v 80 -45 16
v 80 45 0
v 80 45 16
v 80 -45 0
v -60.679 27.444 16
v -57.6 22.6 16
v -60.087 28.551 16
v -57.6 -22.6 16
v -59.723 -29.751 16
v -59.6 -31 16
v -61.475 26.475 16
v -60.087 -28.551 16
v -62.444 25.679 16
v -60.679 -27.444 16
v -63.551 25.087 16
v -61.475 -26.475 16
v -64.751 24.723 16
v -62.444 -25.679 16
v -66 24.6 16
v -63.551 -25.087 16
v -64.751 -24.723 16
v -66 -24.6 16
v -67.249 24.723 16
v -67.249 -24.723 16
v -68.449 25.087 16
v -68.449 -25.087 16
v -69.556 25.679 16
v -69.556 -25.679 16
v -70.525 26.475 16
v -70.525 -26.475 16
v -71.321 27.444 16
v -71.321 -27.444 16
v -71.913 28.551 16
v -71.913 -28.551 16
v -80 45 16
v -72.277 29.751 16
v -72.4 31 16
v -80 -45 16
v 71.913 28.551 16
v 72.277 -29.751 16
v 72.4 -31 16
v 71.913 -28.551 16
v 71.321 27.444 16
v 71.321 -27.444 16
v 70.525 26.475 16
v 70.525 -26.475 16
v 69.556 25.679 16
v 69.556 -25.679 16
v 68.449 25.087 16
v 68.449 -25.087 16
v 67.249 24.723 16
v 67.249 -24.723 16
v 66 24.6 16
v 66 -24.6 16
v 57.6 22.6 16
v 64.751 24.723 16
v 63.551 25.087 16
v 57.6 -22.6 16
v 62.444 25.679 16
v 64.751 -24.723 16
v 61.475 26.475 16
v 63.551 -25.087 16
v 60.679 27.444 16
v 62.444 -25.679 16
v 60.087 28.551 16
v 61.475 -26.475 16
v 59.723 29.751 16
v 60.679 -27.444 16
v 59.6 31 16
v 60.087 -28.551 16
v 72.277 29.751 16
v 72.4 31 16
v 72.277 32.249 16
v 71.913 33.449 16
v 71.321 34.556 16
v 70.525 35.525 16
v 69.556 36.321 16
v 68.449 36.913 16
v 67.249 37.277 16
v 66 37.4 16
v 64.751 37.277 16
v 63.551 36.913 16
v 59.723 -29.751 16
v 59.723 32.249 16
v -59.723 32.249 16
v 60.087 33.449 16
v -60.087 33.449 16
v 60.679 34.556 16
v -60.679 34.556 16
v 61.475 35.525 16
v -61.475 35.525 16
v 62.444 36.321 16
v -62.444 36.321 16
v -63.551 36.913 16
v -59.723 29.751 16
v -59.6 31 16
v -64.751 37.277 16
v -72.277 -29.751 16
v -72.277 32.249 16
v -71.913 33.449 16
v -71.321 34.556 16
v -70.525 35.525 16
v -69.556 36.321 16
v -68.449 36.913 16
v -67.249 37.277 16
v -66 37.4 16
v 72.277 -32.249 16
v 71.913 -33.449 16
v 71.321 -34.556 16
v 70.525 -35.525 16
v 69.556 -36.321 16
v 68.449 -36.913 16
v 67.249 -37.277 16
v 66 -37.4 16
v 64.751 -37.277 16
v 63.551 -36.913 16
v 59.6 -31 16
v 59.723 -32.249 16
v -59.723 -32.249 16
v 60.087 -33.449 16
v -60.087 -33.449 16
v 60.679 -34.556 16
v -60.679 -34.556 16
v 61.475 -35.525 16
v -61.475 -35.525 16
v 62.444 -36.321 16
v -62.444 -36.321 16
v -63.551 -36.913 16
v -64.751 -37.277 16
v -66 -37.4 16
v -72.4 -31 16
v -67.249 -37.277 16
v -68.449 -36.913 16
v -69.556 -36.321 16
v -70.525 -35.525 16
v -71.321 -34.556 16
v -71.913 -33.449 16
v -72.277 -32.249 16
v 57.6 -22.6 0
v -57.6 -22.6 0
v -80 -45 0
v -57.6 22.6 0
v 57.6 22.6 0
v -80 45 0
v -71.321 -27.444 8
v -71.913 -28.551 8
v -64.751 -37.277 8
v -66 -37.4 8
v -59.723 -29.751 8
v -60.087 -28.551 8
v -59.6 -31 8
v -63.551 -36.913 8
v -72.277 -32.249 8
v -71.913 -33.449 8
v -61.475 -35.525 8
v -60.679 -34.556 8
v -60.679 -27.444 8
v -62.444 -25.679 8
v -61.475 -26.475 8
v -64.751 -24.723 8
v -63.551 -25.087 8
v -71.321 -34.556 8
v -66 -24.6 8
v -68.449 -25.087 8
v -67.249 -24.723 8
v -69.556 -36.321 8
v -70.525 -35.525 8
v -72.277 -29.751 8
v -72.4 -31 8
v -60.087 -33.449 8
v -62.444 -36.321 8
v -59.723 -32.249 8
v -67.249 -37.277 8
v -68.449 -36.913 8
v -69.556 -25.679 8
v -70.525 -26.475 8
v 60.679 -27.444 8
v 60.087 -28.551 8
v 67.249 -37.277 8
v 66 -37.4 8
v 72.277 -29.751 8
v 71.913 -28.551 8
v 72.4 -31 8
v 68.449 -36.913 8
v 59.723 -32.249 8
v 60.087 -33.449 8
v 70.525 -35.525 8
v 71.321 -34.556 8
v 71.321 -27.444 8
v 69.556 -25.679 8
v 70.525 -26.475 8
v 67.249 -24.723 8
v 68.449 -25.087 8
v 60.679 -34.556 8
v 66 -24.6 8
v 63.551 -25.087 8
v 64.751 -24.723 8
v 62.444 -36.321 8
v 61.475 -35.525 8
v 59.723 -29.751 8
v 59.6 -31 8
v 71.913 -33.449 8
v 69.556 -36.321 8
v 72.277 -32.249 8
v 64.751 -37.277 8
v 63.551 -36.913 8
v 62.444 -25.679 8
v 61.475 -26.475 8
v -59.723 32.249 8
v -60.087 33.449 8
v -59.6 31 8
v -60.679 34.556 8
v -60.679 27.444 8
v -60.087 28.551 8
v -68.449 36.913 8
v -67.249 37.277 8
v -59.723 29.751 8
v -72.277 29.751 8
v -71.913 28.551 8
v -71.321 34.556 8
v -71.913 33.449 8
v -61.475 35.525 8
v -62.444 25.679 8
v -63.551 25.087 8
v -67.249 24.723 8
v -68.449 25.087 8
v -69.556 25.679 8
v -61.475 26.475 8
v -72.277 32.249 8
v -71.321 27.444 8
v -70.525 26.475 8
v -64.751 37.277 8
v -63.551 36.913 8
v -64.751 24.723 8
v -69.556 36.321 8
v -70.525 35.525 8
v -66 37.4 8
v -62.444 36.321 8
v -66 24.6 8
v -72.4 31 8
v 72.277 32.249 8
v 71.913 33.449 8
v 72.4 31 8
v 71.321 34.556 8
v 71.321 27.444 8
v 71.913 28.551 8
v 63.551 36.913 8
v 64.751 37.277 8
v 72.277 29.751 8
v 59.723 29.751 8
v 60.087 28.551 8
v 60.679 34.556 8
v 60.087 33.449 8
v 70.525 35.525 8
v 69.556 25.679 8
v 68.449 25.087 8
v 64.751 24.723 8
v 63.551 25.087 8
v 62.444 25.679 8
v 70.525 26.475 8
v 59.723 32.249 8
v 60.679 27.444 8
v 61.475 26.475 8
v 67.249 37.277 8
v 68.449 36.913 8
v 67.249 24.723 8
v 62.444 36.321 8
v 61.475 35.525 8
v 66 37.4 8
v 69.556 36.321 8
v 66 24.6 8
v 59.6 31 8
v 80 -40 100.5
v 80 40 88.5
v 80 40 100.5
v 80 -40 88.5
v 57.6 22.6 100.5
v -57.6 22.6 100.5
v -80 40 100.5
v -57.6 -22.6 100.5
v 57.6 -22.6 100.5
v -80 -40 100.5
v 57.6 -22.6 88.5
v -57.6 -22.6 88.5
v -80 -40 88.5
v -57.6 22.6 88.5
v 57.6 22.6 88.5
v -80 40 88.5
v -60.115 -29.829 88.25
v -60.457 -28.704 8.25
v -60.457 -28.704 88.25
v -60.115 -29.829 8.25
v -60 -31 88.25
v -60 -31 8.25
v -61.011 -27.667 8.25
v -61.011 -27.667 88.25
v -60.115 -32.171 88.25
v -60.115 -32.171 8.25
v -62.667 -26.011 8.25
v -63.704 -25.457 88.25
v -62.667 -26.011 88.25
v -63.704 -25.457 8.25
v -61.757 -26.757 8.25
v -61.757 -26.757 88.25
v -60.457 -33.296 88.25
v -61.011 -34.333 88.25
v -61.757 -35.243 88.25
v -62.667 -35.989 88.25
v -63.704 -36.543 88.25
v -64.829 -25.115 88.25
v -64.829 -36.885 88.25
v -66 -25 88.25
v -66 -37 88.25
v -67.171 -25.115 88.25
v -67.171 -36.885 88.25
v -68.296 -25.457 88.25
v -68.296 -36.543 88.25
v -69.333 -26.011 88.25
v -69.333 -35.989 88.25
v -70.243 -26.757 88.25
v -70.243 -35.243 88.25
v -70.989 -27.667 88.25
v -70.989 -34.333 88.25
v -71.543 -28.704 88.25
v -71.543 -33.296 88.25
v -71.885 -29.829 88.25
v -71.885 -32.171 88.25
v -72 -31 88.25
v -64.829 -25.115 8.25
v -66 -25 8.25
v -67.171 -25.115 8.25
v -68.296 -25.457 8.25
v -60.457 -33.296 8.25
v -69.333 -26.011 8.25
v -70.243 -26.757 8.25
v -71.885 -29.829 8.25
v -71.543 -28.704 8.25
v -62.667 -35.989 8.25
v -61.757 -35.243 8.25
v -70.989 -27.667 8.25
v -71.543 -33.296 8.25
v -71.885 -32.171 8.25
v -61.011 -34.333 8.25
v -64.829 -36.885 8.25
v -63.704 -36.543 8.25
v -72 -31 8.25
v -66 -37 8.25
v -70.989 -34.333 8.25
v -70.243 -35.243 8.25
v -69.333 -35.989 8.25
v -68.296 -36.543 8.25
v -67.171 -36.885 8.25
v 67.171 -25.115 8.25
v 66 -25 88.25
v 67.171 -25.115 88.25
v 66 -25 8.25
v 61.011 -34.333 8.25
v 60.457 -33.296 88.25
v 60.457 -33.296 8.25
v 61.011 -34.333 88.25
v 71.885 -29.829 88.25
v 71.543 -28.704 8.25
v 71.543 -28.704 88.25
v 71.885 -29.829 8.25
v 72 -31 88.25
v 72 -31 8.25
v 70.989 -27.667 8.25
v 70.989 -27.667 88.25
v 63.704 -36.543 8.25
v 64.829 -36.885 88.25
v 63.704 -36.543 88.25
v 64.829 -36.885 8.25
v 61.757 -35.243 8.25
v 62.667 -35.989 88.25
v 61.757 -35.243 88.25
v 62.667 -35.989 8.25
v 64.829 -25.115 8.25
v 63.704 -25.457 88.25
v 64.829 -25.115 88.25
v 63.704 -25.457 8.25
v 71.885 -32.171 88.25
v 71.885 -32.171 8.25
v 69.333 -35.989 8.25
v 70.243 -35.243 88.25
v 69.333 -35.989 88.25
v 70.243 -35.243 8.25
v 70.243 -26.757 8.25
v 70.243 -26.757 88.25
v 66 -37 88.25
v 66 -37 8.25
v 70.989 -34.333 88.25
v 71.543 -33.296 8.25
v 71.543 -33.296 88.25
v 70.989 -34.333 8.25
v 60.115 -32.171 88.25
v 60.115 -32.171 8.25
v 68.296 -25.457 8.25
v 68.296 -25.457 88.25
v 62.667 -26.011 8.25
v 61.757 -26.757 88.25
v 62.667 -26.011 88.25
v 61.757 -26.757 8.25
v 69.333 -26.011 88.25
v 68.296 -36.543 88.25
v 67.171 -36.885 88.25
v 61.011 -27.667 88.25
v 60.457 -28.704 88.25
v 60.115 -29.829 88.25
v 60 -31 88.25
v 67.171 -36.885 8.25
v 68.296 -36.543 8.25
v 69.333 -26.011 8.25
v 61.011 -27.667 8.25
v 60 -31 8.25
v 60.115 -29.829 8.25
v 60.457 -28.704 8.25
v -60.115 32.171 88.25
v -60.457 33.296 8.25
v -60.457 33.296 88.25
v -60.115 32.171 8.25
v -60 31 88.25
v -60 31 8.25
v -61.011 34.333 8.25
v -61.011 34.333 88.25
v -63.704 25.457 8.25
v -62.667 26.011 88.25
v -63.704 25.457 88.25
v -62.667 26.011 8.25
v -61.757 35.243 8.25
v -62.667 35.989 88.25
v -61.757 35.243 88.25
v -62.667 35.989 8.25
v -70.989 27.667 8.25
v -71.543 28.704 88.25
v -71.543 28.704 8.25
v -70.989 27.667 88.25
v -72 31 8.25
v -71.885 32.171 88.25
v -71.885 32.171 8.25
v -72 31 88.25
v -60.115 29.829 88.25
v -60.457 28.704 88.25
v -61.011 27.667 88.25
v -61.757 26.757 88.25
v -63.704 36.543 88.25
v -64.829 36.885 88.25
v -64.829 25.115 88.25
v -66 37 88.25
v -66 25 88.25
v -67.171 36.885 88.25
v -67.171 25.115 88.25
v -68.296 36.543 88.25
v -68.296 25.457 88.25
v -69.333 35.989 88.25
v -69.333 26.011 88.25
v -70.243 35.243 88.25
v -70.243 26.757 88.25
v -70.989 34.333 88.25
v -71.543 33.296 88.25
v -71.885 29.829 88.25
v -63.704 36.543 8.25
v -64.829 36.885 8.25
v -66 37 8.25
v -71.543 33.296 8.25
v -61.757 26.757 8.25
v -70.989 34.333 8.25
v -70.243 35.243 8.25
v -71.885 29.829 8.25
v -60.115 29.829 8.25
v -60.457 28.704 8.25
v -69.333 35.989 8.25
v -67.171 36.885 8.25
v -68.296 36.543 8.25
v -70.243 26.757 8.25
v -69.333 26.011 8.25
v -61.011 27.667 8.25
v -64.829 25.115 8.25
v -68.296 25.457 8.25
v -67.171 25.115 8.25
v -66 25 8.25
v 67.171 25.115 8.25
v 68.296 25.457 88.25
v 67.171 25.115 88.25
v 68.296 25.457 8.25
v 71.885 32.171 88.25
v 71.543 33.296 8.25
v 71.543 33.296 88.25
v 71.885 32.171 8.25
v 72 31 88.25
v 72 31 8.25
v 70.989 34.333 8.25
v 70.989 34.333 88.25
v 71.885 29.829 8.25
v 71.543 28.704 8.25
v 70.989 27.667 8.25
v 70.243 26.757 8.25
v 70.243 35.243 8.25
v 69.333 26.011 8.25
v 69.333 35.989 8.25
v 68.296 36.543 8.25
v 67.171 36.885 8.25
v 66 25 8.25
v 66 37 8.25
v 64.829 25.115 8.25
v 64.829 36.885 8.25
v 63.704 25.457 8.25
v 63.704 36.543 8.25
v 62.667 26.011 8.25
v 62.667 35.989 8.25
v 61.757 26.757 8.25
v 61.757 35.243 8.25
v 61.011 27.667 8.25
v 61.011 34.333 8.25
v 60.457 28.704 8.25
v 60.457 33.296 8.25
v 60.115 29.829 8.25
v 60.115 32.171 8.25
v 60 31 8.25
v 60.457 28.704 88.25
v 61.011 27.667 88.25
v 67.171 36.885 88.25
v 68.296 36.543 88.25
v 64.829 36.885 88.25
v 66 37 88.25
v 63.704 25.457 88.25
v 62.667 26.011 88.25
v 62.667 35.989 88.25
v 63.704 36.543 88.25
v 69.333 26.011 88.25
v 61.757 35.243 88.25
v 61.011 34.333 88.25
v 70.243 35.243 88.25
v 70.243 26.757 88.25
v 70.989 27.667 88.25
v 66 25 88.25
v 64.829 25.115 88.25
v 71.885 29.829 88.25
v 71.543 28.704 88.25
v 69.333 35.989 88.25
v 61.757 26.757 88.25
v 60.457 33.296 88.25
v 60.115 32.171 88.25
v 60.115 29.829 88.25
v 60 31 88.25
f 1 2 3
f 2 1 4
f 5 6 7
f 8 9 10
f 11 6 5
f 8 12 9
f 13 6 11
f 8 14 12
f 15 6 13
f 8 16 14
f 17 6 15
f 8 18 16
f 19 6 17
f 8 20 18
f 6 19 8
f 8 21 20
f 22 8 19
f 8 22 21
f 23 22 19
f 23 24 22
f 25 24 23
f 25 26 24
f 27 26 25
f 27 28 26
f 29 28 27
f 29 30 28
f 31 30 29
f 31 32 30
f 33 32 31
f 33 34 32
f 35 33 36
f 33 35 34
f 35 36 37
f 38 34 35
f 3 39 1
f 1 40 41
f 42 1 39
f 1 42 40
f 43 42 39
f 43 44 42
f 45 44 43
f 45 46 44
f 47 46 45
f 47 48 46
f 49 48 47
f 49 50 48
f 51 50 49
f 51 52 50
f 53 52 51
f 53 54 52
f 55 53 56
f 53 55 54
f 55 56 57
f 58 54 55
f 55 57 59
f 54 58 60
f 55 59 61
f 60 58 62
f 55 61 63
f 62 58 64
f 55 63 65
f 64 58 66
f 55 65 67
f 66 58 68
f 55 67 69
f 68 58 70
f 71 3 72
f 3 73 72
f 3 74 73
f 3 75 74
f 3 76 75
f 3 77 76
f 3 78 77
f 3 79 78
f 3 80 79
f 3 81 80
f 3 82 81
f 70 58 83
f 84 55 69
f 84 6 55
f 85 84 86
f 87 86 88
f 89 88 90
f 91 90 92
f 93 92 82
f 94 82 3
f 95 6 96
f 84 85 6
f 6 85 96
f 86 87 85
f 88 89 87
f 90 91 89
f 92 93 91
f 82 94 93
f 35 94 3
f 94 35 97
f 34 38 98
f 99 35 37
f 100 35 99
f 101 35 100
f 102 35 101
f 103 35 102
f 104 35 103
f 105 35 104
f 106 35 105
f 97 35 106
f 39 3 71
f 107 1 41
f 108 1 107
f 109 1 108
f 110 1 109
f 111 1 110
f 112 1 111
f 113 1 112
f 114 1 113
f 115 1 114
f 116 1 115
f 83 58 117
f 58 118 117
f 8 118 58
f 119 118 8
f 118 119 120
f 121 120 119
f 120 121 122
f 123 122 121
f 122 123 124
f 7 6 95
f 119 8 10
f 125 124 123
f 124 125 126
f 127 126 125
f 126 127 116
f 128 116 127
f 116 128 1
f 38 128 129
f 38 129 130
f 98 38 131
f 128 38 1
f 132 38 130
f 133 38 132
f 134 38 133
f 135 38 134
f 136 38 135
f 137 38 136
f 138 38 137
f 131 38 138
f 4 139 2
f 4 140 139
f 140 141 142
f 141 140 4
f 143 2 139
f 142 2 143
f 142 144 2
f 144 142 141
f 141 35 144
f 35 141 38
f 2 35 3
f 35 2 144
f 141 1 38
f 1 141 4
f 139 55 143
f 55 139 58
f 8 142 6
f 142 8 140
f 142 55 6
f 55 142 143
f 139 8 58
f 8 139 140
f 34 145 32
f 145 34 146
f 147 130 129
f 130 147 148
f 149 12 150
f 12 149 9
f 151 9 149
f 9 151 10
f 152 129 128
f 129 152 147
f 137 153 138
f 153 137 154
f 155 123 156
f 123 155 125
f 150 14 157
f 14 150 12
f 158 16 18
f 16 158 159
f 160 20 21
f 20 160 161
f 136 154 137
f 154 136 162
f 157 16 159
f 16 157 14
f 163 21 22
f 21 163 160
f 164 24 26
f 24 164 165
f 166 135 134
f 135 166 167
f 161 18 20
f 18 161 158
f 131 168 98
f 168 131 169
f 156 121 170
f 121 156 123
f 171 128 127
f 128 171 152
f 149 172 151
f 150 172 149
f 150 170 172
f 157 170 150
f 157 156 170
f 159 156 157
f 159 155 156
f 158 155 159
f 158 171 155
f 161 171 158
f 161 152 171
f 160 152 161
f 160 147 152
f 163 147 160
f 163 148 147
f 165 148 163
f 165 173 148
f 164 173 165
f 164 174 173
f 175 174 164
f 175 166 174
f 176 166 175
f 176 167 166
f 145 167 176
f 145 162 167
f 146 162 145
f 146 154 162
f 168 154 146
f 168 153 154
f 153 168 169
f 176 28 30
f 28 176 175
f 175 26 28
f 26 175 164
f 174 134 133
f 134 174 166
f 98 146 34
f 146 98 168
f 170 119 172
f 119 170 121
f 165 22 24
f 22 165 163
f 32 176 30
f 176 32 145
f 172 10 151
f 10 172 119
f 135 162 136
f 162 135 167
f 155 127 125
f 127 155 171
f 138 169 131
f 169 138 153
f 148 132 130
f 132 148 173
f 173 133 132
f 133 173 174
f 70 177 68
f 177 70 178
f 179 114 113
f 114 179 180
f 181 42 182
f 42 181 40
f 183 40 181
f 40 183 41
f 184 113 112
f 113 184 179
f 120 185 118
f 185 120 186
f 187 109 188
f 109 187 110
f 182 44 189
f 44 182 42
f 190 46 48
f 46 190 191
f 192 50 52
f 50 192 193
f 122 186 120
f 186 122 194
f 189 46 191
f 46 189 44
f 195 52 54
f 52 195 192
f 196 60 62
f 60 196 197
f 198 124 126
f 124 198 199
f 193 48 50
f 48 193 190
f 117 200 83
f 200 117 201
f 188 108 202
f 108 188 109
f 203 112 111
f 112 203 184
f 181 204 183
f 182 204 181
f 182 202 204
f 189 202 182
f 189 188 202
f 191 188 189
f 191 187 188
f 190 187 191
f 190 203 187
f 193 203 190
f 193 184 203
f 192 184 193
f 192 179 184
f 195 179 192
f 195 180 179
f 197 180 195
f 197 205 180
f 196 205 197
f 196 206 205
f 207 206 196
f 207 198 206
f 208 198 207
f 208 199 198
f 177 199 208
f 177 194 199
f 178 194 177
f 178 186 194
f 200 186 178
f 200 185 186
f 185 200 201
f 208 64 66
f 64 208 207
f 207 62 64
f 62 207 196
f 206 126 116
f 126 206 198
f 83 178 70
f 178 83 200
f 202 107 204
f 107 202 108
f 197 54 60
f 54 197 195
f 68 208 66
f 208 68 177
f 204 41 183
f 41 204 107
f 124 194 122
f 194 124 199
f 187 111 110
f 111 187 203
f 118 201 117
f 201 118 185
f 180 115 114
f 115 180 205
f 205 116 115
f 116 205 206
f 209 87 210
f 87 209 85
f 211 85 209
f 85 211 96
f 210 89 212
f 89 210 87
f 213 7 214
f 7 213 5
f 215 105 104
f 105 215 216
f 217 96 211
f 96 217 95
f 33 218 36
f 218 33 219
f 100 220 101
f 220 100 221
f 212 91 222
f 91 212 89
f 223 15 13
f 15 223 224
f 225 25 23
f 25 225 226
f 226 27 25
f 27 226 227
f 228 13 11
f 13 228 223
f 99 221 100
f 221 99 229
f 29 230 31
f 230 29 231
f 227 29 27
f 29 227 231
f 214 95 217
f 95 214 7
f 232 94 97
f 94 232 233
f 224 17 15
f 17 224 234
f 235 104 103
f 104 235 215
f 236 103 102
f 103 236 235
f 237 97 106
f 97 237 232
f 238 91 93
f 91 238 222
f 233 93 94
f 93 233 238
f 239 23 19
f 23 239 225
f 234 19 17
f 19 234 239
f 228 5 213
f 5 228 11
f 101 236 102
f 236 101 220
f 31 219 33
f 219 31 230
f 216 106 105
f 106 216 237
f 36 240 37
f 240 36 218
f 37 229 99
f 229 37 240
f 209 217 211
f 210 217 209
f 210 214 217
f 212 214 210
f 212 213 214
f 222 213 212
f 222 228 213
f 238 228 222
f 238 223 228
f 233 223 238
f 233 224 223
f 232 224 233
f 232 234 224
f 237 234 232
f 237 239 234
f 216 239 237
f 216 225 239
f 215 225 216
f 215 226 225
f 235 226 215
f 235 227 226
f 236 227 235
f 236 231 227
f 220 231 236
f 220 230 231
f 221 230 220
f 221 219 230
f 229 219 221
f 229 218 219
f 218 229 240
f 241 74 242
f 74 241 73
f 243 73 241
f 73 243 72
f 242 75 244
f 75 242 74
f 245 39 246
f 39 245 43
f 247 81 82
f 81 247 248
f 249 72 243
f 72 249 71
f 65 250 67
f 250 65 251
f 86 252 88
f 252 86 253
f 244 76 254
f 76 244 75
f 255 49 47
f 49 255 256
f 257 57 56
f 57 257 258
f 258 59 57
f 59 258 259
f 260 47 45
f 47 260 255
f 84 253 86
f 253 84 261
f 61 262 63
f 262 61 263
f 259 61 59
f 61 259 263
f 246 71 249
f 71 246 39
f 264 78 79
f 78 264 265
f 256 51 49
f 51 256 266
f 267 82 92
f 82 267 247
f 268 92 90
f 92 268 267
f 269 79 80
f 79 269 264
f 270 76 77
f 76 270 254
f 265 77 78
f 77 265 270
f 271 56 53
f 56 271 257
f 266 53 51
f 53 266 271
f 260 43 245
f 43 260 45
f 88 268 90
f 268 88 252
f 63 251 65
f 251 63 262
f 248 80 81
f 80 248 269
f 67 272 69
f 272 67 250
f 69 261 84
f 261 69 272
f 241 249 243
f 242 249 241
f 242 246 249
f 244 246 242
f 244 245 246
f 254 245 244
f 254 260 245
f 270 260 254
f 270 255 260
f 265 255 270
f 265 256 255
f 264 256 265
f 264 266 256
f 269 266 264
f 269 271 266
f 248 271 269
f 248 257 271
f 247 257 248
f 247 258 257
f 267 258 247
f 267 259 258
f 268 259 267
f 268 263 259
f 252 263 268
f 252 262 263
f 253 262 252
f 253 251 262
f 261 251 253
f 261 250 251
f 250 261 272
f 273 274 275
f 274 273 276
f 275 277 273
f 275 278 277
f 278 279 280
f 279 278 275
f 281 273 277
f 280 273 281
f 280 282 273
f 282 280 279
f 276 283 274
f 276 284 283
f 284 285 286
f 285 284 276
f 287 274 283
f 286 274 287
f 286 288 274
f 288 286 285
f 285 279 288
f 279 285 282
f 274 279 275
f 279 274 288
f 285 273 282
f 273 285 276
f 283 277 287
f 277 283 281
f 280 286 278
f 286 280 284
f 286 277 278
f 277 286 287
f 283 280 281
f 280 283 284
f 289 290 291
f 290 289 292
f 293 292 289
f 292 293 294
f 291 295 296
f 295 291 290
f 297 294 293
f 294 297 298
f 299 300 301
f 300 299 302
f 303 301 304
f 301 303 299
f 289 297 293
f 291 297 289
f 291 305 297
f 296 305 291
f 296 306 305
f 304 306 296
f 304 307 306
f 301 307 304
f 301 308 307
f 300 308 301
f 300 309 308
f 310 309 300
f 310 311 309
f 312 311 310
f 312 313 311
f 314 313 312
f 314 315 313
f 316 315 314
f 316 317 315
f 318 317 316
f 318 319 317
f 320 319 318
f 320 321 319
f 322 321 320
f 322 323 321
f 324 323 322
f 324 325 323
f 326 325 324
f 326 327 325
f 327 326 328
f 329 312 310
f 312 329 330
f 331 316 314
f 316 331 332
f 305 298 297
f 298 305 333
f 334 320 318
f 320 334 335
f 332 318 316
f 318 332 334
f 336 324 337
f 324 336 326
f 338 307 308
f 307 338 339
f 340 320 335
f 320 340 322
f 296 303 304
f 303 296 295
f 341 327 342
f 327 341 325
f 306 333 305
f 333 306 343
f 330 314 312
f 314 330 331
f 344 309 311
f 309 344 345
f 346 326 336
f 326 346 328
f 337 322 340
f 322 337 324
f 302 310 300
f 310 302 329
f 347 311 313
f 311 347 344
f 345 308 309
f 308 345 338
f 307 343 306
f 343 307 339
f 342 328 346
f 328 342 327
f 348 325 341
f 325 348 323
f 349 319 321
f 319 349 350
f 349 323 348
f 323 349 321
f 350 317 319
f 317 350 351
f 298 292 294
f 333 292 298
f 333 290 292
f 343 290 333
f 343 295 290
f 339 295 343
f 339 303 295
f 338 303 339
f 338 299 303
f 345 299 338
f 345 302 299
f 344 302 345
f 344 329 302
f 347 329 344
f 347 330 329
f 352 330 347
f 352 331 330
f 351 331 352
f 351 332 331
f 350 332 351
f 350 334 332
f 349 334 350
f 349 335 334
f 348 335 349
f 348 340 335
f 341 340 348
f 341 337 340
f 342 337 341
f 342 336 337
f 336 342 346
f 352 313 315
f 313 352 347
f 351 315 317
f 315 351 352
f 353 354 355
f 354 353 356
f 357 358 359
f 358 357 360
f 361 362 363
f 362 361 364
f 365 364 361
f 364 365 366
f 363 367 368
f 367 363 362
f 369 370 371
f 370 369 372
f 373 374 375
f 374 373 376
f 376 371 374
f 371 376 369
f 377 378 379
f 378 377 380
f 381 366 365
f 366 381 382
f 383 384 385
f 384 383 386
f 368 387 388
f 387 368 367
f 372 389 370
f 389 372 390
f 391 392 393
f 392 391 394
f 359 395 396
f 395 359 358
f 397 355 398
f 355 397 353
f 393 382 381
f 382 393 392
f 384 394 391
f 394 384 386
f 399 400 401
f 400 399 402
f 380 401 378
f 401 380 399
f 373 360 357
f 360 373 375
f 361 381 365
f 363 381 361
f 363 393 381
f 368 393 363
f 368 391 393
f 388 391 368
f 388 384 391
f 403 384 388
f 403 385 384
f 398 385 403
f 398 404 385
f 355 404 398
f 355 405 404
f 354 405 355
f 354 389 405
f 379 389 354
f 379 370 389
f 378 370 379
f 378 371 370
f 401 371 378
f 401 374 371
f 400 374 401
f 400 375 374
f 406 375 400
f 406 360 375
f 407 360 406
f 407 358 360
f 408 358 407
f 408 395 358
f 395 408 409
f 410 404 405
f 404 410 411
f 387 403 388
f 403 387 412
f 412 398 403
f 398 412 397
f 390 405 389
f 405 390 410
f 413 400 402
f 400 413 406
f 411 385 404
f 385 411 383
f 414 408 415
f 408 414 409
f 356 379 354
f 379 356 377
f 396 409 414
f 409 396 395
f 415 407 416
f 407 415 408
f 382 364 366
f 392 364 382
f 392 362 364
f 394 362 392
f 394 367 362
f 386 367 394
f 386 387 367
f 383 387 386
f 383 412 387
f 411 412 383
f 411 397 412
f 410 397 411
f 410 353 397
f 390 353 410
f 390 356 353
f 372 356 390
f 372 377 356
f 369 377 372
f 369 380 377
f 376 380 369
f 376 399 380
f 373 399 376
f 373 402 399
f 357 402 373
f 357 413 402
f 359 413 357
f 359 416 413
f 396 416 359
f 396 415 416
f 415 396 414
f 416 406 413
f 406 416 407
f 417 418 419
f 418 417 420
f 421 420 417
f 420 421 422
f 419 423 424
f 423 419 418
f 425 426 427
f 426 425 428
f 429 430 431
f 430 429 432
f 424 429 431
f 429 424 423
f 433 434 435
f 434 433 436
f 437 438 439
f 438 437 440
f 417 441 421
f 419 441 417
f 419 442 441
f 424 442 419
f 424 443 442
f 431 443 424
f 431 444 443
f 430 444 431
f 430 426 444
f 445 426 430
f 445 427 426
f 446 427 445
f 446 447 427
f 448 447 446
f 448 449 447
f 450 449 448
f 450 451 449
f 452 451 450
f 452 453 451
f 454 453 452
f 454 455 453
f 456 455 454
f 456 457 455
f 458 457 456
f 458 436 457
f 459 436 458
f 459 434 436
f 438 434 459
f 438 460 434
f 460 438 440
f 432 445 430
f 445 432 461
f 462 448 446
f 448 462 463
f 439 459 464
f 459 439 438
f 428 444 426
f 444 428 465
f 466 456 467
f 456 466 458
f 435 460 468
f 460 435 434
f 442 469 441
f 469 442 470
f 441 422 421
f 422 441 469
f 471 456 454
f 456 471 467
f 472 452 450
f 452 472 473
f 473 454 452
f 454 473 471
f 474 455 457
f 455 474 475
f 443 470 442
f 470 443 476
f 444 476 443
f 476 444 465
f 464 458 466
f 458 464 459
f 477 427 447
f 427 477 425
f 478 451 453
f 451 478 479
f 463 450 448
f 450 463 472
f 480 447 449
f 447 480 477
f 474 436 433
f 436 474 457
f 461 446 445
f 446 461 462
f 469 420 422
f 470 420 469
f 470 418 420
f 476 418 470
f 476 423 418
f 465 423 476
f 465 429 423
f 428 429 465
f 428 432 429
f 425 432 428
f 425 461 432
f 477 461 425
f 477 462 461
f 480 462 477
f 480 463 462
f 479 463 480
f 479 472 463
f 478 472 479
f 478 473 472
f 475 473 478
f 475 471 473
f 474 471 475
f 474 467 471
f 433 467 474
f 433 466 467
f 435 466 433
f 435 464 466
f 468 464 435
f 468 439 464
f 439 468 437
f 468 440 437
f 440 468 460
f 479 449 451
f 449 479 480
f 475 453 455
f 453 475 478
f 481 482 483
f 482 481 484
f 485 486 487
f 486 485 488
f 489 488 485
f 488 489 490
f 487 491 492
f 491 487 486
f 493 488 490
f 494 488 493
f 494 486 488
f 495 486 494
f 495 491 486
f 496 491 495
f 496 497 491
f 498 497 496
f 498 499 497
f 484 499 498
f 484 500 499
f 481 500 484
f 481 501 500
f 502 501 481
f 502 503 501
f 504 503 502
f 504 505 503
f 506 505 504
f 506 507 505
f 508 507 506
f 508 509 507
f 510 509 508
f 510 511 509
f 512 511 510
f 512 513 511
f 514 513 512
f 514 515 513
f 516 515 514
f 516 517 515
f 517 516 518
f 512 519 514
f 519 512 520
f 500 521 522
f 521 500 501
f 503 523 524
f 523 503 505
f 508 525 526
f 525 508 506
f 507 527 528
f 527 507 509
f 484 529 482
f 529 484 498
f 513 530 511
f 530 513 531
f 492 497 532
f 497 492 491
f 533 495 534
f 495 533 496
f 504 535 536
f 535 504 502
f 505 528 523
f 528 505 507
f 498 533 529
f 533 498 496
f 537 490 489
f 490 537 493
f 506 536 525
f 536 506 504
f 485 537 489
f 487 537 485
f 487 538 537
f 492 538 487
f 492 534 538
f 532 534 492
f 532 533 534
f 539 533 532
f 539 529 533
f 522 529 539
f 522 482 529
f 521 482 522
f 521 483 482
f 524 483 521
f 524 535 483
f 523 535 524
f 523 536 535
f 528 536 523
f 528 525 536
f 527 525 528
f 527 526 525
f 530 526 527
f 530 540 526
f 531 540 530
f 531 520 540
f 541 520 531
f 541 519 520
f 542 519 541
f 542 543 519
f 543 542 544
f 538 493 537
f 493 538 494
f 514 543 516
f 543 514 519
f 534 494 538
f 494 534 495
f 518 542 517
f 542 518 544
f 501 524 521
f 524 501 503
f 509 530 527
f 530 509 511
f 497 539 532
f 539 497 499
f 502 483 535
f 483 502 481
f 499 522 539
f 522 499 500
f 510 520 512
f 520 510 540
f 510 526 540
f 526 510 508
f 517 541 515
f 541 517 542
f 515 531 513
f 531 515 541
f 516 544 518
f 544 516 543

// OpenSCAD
$fn = 32;

// ------------------------------------------------------------------------
// Frame cube: base 160 x 90 mm, posts 80 mm tall
// Every part is its own module, assembly() places every instance.
// ------------------------------------------------------------------------

// --- part 1 ---
module base_frame() {
  difference() {
    translate([-80, -45, 0]) cube([160, 90, 16]);
    translate([-57.6, -22.6, -1]) cube([115.2, 45.2, 18]);
    translate([-66, -31, 8]) cylinder(h = 9, d = 12.8);
    translate([66, -31, 8]) cylinder(h = 9, d = 12.8);
    translate([-66, 31, 8]) cylinder(h = 9, d = 12.8);
    translate([66, 31, 8]) cylinder(h = 9, d = 12.8);
  }
}

// --- part 2 ---
module corner_post() {
  cylinder(h = 80, d = 12);
}

// --- part 3 ---
module top_frame() {
  difference() {
    translate([-80, -40, 0]) cube([160, 80, 12]);
    translate([-57.6, -22.6, -1]) cube([115.2, 45.2, 14]);
  }
}

// --- assembly ---
module assembly() {
  color([0.80, 0.24, 0.20]) translate([0, 0, 0]) rotate([0, 0, 0]) base_frame();
  color([0.20, 0.45, 0.75]) translate([-66, -31, 8.25]) rotate([0, 0, 0]) corner_post();
  color([0.25, 0.62, 0.32]) translate([66, -31, 8.25]) rotate([0, 0, 0]) corner_post();
  color([0.92, 0.70, 0.18]) translate([-66, 31, 8.25]) rotate([0, 0, 0]) corner_post();
  color([0.58, 0.35, 0.70]) translate([66, 31, 8.25]) rotate([0, 0, 0]) corner_post();
  color([0.16, 0.66, 0.66]) translate([0, 0, 88.5]) rotate([0, 0, 0]) top_frame();
}

assembly();
